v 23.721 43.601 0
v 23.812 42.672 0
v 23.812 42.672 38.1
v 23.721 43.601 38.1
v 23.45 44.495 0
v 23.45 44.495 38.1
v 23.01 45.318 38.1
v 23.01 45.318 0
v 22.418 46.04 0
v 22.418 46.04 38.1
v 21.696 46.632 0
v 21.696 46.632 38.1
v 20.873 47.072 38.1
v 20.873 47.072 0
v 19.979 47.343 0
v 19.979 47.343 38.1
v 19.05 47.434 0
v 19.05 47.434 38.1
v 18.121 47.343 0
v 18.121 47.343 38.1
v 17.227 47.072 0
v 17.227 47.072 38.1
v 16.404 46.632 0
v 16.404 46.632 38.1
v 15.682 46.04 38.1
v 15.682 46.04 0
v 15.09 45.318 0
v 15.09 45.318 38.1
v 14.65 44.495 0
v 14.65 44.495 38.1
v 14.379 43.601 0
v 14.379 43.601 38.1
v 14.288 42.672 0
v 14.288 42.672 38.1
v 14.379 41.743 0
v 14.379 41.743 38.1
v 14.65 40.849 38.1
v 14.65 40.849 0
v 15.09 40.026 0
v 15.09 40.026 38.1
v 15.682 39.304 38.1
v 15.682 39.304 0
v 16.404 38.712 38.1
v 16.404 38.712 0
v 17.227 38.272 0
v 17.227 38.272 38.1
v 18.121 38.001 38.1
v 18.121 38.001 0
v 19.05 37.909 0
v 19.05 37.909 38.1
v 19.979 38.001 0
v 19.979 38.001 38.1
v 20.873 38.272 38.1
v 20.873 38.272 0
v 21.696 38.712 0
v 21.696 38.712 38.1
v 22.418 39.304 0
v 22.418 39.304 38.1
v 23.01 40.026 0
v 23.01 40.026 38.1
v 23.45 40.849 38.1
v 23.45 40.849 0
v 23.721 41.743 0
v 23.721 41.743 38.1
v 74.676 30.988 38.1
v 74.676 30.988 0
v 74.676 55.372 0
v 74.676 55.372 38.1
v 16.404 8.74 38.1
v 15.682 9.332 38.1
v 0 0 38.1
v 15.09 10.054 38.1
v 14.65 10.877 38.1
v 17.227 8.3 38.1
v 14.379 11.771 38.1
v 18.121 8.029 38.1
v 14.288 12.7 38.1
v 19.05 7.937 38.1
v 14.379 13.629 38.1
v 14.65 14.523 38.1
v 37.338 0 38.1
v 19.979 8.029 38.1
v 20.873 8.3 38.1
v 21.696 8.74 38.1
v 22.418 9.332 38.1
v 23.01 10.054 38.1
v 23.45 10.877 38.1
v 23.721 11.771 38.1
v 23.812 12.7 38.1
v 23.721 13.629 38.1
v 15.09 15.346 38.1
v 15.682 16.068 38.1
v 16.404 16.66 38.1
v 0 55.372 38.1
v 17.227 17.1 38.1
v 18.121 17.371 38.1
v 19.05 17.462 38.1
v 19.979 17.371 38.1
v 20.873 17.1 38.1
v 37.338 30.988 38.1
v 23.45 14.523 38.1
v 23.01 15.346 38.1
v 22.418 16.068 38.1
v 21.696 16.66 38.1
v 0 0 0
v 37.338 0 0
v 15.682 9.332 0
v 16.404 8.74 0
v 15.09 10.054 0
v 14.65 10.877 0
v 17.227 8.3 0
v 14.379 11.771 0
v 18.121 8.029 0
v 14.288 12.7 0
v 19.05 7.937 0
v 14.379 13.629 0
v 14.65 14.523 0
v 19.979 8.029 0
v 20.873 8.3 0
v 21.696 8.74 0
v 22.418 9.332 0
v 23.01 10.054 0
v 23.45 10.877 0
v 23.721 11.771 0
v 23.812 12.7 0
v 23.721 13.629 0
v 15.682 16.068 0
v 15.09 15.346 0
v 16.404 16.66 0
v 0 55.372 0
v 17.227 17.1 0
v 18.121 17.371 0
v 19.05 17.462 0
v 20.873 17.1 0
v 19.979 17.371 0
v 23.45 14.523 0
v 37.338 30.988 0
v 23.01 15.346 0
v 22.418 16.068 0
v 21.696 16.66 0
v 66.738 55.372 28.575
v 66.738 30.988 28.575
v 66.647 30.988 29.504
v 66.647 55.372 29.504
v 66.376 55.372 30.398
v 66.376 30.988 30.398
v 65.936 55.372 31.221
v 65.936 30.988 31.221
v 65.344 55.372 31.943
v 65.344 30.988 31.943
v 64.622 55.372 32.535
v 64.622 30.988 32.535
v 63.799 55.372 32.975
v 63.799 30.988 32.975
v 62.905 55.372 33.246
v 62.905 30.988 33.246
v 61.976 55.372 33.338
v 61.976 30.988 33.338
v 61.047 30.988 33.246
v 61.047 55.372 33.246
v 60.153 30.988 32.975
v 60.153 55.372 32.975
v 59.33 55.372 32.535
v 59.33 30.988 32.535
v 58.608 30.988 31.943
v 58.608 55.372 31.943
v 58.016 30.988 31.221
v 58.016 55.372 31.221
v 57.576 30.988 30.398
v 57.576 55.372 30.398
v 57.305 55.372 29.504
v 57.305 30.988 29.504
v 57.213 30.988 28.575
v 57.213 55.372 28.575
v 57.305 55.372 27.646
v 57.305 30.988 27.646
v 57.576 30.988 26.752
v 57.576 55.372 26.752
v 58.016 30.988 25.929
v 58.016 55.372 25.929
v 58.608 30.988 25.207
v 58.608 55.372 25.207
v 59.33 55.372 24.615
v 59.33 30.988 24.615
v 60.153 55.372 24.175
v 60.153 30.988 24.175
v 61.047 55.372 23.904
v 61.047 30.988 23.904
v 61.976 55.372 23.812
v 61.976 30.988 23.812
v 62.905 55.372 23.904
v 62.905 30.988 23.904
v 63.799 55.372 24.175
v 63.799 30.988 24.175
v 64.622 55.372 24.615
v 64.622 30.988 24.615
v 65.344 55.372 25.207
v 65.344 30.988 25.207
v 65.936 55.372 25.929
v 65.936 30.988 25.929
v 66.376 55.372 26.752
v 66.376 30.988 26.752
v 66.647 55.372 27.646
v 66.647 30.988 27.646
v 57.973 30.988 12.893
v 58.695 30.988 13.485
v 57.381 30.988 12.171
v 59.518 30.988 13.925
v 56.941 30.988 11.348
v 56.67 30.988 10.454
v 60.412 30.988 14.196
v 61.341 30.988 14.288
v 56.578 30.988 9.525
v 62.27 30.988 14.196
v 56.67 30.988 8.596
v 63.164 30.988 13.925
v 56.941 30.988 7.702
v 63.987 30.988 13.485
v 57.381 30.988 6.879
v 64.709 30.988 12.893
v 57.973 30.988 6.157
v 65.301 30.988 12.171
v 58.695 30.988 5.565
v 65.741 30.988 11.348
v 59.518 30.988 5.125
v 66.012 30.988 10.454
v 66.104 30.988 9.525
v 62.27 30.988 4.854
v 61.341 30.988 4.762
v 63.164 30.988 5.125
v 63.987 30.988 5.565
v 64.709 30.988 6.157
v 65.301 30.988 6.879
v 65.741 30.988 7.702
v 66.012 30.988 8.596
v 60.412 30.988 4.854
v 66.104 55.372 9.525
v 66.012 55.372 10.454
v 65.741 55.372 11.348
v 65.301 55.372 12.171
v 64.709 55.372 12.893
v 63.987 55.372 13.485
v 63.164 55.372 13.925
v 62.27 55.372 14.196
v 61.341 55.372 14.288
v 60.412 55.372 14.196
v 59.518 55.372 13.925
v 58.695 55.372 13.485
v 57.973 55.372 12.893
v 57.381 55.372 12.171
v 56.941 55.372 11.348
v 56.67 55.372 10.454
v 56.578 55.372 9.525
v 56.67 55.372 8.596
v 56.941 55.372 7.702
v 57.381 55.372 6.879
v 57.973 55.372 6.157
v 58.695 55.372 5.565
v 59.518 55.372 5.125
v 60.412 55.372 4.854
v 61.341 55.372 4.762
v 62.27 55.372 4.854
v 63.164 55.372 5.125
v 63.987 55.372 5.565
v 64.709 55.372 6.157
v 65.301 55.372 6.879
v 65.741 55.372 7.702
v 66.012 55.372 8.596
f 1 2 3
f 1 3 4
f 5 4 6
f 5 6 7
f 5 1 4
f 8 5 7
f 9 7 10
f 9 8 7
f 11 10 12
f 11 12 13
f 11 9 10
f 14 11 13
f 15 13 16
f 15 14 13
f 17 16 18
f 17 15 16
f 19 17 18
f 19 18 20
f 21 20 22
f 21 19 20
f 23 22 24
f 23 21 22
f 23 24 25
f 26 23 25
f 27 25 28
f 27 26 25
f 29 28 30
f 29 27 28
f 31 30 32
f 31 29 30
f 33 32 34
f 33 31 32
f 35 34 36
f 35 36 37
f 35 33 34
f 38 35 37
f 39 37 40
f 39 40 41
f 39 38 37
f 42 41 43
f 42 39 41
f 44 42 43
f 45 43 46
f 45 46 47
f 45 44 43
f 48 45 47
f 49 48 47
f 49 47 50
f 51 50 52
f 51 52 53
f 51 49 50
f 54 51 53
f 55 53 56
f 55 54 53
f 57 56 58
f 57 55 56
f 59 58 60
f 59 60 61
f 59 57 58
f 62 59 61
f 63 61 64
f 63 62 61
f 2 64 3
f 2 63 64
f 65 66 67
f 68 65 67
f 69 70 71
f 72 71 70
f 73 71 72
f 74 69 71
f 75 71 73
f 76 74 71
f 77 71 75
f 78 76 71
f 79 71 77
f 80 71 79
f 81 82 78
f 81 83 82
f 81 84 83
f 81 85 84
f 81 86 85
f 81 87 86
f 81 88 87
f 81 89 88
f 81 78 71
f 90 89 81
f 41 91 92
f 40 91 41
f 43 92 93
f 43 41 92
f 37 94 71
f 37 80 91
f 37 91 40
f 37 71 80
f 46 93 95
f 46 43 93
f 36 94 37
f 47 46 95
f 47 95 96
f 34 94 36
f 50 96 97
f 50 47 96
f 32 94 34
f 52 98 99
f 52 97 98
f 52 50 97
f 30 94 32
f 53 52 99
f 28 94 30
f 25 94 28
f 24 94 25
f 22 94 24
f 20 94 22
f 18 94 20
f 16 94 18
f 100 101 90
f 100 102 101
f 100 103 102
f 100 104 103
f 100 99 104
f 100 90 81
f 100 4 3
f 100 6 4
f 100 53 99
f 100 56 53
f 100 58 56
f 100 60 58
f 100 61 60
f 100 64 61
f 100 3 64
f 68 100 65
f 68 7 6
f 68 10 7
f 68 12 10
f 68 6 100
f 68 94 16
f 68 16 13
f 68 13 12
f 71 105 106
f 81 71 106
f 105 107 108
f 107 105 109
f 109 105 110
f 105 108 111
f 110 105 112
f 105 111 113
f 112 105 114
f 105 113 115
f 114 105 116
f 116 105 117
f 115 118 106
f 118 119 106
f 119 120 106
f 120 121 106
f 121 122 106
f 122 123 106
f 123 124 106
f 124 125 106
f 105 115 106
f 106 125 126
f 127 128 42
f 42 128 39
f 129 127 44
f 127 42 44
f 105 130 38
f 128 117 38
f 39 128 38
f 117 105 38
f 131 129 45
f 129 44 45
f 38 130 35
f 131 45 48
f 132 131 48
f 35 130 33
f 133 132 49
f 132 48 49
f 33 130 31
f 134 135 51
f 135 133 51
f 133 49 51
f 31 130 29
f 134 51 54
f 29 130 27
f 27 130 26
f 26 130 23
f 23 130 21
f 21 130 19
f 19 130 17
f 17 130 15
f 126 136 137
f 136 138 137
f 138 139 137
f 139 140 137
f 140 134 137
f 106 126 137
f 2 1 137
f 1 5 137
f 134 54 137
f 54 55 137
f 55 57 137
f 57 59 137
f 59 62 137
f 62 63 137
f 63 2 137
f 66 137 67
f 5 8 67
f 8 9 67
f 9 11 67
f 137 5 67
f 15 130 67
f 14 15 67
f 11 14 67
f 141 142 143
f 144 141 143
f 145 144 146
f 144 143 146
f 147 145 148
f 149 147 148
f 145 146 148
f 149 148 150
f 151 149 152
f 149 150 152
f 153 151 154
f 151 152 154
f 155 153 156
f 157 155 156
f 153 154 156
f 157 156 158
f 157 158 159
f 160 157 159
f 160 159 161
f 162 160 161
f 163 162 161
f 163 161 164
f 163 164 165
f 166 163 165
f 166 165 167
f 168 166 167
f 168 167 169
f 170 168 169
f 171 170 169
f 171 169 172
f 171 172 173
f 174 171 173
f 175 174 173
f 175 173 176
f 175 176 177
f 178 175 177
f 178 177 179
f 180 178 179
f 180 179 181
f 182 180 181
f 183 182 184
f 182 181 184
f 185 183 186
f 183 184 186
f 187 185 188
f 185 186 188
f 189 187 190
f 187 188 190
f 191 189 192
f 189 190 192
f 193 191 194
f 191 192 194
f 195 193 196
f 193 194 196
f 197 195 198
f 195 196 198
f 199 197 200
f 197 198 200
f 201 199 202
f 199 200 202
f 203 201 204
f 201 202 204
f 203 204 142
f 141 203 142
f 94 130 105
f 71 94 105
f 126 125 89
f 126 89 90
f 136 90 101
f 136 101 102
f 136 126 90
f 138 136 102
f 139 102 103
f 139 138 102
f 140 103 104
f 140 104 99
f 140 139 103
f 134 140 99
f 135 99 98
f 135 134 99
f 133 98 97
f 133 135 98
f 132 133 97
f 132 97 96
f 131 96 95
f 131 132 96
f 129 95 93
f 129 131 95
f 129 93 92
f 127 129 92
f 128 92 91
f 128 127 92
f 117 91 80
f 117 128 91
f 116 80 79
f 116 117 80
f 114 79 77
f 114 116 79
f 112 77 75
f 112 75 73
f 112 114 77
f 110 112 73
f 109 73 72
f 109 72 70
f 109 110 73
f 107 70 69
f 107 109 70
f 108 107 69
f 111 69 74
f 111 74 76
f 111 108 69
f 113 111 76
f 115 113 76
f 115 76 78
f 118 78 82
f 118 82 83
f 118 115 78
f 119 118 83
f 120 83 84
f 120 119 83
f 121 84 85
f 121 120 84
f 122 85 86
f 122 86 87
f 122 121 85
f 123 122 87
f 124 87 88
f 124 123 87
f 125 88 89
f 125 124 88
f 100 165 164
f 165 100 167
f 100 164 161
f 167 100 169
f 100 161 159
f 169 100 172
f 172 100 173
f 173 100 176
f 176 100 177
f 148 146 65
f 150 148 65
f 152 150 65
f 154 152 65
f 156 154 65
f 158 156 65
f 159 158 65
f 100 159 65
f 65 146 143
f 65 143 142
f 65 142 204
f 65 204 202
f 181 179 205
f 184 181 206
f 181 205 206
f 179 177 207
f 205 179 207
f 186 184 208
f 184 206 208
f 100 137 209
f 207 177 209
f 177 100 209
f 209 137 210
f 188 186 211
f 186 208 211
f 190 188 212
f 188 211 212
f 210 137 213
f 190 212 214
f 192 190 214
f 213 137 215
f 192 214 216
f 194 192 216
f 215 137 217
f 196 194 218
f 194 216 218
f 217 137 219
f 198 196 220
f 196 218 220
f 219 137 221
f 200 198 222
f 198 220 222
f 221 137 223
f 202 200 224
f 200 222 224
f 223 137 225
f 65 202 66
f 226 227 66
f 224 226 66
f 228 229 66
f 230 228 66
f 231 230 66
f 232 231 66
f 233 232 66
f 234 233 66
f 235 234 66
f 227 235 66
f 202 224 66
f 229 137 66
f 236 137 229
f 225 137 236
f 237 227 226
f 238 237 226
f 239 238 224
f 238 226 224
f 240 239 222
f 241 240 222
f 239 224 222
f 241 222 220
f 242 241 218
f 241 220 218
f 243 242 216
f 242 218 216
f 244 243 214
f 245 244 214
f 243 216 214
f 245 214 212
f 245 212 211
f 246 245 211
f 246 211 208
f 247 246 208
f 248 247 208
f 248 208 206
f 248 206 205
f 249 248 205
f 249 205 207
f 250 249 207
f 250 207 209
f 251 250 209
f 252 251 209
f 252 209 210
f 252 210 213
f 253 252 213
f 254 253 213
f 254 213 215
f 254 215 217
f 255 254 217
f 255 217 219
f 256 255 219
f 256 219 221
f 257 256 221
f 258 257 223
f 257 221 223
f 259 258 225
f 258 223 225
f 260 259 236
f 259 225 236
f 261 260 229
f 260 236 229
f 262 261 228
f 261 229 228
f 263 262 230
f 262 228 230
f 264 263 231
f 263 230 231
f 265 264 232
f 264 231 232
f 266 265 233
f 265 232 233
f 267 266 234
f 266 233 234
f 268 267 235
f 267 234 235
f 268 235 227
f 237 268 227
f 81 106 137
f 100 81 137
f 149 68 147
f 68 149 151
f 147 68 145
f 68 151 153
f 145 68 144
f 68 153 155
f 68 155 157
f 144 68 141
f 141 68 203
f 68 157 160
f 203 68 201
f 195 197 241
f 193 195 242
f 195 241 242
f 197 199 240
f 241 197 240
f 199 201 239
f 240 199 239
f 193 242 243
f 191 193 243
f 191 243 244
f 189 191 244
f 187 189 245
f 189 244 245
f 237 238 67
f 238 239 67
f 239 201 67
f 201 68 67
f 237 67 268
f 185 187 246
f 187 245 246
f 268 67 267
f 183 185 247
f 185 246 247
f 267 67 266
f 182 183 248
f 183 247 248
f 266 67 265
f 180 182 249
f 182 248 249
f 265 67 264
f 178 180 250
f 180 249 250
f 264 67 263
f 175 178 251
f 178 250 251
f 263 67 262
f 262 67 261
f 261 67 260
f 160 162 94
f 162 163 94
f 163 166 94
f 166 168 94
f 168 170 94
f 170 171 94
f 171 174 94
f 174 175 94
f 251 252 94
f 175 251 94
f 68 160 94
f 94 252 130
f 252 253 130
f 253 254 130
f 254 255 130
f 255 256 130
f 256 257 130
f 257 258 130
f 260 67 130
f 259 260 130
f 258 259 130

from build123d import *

# Parameters (mm, degrees)
F0_R     = 4.7625
F1_DEPTH = 38.1
F2_R     = 4.7625
F3_DEPTH = 24.385


with BuildPart() as f1:
    # F0 (on Top) → F1 (new body)
    with BuildSketch(Plane.XY):
        Polygon((0, 55.372), (0, 0), (37.338, 0), (37.338, 30.988), (74.676, 30.988), (74.676, 55.372), (37.338, 55.372), align=None)
        with Locations((19.05, 12.7)):
            Circle(F0_R, mode=Mode.SUBTRACT)
        with Locations((19.05, 42.672)):
            Circle(F0_R, mode=Mode.SUBTRACT)
    extrude(amount=F1_DEPTH)

    # F2 (on face) → F3 (cut, through all)
    with BuildSketch(Plane.XZ.offset(-30.988)):
        with Locations((61.976, 28.575)):
            Circle(F2_R)
        with Locations((61.341, 9.525)):
            Circle(F2_R)
    extrude(amount=-F3_DEPTH, mode=Mode.SUBTRACT)


solid = f1.part
